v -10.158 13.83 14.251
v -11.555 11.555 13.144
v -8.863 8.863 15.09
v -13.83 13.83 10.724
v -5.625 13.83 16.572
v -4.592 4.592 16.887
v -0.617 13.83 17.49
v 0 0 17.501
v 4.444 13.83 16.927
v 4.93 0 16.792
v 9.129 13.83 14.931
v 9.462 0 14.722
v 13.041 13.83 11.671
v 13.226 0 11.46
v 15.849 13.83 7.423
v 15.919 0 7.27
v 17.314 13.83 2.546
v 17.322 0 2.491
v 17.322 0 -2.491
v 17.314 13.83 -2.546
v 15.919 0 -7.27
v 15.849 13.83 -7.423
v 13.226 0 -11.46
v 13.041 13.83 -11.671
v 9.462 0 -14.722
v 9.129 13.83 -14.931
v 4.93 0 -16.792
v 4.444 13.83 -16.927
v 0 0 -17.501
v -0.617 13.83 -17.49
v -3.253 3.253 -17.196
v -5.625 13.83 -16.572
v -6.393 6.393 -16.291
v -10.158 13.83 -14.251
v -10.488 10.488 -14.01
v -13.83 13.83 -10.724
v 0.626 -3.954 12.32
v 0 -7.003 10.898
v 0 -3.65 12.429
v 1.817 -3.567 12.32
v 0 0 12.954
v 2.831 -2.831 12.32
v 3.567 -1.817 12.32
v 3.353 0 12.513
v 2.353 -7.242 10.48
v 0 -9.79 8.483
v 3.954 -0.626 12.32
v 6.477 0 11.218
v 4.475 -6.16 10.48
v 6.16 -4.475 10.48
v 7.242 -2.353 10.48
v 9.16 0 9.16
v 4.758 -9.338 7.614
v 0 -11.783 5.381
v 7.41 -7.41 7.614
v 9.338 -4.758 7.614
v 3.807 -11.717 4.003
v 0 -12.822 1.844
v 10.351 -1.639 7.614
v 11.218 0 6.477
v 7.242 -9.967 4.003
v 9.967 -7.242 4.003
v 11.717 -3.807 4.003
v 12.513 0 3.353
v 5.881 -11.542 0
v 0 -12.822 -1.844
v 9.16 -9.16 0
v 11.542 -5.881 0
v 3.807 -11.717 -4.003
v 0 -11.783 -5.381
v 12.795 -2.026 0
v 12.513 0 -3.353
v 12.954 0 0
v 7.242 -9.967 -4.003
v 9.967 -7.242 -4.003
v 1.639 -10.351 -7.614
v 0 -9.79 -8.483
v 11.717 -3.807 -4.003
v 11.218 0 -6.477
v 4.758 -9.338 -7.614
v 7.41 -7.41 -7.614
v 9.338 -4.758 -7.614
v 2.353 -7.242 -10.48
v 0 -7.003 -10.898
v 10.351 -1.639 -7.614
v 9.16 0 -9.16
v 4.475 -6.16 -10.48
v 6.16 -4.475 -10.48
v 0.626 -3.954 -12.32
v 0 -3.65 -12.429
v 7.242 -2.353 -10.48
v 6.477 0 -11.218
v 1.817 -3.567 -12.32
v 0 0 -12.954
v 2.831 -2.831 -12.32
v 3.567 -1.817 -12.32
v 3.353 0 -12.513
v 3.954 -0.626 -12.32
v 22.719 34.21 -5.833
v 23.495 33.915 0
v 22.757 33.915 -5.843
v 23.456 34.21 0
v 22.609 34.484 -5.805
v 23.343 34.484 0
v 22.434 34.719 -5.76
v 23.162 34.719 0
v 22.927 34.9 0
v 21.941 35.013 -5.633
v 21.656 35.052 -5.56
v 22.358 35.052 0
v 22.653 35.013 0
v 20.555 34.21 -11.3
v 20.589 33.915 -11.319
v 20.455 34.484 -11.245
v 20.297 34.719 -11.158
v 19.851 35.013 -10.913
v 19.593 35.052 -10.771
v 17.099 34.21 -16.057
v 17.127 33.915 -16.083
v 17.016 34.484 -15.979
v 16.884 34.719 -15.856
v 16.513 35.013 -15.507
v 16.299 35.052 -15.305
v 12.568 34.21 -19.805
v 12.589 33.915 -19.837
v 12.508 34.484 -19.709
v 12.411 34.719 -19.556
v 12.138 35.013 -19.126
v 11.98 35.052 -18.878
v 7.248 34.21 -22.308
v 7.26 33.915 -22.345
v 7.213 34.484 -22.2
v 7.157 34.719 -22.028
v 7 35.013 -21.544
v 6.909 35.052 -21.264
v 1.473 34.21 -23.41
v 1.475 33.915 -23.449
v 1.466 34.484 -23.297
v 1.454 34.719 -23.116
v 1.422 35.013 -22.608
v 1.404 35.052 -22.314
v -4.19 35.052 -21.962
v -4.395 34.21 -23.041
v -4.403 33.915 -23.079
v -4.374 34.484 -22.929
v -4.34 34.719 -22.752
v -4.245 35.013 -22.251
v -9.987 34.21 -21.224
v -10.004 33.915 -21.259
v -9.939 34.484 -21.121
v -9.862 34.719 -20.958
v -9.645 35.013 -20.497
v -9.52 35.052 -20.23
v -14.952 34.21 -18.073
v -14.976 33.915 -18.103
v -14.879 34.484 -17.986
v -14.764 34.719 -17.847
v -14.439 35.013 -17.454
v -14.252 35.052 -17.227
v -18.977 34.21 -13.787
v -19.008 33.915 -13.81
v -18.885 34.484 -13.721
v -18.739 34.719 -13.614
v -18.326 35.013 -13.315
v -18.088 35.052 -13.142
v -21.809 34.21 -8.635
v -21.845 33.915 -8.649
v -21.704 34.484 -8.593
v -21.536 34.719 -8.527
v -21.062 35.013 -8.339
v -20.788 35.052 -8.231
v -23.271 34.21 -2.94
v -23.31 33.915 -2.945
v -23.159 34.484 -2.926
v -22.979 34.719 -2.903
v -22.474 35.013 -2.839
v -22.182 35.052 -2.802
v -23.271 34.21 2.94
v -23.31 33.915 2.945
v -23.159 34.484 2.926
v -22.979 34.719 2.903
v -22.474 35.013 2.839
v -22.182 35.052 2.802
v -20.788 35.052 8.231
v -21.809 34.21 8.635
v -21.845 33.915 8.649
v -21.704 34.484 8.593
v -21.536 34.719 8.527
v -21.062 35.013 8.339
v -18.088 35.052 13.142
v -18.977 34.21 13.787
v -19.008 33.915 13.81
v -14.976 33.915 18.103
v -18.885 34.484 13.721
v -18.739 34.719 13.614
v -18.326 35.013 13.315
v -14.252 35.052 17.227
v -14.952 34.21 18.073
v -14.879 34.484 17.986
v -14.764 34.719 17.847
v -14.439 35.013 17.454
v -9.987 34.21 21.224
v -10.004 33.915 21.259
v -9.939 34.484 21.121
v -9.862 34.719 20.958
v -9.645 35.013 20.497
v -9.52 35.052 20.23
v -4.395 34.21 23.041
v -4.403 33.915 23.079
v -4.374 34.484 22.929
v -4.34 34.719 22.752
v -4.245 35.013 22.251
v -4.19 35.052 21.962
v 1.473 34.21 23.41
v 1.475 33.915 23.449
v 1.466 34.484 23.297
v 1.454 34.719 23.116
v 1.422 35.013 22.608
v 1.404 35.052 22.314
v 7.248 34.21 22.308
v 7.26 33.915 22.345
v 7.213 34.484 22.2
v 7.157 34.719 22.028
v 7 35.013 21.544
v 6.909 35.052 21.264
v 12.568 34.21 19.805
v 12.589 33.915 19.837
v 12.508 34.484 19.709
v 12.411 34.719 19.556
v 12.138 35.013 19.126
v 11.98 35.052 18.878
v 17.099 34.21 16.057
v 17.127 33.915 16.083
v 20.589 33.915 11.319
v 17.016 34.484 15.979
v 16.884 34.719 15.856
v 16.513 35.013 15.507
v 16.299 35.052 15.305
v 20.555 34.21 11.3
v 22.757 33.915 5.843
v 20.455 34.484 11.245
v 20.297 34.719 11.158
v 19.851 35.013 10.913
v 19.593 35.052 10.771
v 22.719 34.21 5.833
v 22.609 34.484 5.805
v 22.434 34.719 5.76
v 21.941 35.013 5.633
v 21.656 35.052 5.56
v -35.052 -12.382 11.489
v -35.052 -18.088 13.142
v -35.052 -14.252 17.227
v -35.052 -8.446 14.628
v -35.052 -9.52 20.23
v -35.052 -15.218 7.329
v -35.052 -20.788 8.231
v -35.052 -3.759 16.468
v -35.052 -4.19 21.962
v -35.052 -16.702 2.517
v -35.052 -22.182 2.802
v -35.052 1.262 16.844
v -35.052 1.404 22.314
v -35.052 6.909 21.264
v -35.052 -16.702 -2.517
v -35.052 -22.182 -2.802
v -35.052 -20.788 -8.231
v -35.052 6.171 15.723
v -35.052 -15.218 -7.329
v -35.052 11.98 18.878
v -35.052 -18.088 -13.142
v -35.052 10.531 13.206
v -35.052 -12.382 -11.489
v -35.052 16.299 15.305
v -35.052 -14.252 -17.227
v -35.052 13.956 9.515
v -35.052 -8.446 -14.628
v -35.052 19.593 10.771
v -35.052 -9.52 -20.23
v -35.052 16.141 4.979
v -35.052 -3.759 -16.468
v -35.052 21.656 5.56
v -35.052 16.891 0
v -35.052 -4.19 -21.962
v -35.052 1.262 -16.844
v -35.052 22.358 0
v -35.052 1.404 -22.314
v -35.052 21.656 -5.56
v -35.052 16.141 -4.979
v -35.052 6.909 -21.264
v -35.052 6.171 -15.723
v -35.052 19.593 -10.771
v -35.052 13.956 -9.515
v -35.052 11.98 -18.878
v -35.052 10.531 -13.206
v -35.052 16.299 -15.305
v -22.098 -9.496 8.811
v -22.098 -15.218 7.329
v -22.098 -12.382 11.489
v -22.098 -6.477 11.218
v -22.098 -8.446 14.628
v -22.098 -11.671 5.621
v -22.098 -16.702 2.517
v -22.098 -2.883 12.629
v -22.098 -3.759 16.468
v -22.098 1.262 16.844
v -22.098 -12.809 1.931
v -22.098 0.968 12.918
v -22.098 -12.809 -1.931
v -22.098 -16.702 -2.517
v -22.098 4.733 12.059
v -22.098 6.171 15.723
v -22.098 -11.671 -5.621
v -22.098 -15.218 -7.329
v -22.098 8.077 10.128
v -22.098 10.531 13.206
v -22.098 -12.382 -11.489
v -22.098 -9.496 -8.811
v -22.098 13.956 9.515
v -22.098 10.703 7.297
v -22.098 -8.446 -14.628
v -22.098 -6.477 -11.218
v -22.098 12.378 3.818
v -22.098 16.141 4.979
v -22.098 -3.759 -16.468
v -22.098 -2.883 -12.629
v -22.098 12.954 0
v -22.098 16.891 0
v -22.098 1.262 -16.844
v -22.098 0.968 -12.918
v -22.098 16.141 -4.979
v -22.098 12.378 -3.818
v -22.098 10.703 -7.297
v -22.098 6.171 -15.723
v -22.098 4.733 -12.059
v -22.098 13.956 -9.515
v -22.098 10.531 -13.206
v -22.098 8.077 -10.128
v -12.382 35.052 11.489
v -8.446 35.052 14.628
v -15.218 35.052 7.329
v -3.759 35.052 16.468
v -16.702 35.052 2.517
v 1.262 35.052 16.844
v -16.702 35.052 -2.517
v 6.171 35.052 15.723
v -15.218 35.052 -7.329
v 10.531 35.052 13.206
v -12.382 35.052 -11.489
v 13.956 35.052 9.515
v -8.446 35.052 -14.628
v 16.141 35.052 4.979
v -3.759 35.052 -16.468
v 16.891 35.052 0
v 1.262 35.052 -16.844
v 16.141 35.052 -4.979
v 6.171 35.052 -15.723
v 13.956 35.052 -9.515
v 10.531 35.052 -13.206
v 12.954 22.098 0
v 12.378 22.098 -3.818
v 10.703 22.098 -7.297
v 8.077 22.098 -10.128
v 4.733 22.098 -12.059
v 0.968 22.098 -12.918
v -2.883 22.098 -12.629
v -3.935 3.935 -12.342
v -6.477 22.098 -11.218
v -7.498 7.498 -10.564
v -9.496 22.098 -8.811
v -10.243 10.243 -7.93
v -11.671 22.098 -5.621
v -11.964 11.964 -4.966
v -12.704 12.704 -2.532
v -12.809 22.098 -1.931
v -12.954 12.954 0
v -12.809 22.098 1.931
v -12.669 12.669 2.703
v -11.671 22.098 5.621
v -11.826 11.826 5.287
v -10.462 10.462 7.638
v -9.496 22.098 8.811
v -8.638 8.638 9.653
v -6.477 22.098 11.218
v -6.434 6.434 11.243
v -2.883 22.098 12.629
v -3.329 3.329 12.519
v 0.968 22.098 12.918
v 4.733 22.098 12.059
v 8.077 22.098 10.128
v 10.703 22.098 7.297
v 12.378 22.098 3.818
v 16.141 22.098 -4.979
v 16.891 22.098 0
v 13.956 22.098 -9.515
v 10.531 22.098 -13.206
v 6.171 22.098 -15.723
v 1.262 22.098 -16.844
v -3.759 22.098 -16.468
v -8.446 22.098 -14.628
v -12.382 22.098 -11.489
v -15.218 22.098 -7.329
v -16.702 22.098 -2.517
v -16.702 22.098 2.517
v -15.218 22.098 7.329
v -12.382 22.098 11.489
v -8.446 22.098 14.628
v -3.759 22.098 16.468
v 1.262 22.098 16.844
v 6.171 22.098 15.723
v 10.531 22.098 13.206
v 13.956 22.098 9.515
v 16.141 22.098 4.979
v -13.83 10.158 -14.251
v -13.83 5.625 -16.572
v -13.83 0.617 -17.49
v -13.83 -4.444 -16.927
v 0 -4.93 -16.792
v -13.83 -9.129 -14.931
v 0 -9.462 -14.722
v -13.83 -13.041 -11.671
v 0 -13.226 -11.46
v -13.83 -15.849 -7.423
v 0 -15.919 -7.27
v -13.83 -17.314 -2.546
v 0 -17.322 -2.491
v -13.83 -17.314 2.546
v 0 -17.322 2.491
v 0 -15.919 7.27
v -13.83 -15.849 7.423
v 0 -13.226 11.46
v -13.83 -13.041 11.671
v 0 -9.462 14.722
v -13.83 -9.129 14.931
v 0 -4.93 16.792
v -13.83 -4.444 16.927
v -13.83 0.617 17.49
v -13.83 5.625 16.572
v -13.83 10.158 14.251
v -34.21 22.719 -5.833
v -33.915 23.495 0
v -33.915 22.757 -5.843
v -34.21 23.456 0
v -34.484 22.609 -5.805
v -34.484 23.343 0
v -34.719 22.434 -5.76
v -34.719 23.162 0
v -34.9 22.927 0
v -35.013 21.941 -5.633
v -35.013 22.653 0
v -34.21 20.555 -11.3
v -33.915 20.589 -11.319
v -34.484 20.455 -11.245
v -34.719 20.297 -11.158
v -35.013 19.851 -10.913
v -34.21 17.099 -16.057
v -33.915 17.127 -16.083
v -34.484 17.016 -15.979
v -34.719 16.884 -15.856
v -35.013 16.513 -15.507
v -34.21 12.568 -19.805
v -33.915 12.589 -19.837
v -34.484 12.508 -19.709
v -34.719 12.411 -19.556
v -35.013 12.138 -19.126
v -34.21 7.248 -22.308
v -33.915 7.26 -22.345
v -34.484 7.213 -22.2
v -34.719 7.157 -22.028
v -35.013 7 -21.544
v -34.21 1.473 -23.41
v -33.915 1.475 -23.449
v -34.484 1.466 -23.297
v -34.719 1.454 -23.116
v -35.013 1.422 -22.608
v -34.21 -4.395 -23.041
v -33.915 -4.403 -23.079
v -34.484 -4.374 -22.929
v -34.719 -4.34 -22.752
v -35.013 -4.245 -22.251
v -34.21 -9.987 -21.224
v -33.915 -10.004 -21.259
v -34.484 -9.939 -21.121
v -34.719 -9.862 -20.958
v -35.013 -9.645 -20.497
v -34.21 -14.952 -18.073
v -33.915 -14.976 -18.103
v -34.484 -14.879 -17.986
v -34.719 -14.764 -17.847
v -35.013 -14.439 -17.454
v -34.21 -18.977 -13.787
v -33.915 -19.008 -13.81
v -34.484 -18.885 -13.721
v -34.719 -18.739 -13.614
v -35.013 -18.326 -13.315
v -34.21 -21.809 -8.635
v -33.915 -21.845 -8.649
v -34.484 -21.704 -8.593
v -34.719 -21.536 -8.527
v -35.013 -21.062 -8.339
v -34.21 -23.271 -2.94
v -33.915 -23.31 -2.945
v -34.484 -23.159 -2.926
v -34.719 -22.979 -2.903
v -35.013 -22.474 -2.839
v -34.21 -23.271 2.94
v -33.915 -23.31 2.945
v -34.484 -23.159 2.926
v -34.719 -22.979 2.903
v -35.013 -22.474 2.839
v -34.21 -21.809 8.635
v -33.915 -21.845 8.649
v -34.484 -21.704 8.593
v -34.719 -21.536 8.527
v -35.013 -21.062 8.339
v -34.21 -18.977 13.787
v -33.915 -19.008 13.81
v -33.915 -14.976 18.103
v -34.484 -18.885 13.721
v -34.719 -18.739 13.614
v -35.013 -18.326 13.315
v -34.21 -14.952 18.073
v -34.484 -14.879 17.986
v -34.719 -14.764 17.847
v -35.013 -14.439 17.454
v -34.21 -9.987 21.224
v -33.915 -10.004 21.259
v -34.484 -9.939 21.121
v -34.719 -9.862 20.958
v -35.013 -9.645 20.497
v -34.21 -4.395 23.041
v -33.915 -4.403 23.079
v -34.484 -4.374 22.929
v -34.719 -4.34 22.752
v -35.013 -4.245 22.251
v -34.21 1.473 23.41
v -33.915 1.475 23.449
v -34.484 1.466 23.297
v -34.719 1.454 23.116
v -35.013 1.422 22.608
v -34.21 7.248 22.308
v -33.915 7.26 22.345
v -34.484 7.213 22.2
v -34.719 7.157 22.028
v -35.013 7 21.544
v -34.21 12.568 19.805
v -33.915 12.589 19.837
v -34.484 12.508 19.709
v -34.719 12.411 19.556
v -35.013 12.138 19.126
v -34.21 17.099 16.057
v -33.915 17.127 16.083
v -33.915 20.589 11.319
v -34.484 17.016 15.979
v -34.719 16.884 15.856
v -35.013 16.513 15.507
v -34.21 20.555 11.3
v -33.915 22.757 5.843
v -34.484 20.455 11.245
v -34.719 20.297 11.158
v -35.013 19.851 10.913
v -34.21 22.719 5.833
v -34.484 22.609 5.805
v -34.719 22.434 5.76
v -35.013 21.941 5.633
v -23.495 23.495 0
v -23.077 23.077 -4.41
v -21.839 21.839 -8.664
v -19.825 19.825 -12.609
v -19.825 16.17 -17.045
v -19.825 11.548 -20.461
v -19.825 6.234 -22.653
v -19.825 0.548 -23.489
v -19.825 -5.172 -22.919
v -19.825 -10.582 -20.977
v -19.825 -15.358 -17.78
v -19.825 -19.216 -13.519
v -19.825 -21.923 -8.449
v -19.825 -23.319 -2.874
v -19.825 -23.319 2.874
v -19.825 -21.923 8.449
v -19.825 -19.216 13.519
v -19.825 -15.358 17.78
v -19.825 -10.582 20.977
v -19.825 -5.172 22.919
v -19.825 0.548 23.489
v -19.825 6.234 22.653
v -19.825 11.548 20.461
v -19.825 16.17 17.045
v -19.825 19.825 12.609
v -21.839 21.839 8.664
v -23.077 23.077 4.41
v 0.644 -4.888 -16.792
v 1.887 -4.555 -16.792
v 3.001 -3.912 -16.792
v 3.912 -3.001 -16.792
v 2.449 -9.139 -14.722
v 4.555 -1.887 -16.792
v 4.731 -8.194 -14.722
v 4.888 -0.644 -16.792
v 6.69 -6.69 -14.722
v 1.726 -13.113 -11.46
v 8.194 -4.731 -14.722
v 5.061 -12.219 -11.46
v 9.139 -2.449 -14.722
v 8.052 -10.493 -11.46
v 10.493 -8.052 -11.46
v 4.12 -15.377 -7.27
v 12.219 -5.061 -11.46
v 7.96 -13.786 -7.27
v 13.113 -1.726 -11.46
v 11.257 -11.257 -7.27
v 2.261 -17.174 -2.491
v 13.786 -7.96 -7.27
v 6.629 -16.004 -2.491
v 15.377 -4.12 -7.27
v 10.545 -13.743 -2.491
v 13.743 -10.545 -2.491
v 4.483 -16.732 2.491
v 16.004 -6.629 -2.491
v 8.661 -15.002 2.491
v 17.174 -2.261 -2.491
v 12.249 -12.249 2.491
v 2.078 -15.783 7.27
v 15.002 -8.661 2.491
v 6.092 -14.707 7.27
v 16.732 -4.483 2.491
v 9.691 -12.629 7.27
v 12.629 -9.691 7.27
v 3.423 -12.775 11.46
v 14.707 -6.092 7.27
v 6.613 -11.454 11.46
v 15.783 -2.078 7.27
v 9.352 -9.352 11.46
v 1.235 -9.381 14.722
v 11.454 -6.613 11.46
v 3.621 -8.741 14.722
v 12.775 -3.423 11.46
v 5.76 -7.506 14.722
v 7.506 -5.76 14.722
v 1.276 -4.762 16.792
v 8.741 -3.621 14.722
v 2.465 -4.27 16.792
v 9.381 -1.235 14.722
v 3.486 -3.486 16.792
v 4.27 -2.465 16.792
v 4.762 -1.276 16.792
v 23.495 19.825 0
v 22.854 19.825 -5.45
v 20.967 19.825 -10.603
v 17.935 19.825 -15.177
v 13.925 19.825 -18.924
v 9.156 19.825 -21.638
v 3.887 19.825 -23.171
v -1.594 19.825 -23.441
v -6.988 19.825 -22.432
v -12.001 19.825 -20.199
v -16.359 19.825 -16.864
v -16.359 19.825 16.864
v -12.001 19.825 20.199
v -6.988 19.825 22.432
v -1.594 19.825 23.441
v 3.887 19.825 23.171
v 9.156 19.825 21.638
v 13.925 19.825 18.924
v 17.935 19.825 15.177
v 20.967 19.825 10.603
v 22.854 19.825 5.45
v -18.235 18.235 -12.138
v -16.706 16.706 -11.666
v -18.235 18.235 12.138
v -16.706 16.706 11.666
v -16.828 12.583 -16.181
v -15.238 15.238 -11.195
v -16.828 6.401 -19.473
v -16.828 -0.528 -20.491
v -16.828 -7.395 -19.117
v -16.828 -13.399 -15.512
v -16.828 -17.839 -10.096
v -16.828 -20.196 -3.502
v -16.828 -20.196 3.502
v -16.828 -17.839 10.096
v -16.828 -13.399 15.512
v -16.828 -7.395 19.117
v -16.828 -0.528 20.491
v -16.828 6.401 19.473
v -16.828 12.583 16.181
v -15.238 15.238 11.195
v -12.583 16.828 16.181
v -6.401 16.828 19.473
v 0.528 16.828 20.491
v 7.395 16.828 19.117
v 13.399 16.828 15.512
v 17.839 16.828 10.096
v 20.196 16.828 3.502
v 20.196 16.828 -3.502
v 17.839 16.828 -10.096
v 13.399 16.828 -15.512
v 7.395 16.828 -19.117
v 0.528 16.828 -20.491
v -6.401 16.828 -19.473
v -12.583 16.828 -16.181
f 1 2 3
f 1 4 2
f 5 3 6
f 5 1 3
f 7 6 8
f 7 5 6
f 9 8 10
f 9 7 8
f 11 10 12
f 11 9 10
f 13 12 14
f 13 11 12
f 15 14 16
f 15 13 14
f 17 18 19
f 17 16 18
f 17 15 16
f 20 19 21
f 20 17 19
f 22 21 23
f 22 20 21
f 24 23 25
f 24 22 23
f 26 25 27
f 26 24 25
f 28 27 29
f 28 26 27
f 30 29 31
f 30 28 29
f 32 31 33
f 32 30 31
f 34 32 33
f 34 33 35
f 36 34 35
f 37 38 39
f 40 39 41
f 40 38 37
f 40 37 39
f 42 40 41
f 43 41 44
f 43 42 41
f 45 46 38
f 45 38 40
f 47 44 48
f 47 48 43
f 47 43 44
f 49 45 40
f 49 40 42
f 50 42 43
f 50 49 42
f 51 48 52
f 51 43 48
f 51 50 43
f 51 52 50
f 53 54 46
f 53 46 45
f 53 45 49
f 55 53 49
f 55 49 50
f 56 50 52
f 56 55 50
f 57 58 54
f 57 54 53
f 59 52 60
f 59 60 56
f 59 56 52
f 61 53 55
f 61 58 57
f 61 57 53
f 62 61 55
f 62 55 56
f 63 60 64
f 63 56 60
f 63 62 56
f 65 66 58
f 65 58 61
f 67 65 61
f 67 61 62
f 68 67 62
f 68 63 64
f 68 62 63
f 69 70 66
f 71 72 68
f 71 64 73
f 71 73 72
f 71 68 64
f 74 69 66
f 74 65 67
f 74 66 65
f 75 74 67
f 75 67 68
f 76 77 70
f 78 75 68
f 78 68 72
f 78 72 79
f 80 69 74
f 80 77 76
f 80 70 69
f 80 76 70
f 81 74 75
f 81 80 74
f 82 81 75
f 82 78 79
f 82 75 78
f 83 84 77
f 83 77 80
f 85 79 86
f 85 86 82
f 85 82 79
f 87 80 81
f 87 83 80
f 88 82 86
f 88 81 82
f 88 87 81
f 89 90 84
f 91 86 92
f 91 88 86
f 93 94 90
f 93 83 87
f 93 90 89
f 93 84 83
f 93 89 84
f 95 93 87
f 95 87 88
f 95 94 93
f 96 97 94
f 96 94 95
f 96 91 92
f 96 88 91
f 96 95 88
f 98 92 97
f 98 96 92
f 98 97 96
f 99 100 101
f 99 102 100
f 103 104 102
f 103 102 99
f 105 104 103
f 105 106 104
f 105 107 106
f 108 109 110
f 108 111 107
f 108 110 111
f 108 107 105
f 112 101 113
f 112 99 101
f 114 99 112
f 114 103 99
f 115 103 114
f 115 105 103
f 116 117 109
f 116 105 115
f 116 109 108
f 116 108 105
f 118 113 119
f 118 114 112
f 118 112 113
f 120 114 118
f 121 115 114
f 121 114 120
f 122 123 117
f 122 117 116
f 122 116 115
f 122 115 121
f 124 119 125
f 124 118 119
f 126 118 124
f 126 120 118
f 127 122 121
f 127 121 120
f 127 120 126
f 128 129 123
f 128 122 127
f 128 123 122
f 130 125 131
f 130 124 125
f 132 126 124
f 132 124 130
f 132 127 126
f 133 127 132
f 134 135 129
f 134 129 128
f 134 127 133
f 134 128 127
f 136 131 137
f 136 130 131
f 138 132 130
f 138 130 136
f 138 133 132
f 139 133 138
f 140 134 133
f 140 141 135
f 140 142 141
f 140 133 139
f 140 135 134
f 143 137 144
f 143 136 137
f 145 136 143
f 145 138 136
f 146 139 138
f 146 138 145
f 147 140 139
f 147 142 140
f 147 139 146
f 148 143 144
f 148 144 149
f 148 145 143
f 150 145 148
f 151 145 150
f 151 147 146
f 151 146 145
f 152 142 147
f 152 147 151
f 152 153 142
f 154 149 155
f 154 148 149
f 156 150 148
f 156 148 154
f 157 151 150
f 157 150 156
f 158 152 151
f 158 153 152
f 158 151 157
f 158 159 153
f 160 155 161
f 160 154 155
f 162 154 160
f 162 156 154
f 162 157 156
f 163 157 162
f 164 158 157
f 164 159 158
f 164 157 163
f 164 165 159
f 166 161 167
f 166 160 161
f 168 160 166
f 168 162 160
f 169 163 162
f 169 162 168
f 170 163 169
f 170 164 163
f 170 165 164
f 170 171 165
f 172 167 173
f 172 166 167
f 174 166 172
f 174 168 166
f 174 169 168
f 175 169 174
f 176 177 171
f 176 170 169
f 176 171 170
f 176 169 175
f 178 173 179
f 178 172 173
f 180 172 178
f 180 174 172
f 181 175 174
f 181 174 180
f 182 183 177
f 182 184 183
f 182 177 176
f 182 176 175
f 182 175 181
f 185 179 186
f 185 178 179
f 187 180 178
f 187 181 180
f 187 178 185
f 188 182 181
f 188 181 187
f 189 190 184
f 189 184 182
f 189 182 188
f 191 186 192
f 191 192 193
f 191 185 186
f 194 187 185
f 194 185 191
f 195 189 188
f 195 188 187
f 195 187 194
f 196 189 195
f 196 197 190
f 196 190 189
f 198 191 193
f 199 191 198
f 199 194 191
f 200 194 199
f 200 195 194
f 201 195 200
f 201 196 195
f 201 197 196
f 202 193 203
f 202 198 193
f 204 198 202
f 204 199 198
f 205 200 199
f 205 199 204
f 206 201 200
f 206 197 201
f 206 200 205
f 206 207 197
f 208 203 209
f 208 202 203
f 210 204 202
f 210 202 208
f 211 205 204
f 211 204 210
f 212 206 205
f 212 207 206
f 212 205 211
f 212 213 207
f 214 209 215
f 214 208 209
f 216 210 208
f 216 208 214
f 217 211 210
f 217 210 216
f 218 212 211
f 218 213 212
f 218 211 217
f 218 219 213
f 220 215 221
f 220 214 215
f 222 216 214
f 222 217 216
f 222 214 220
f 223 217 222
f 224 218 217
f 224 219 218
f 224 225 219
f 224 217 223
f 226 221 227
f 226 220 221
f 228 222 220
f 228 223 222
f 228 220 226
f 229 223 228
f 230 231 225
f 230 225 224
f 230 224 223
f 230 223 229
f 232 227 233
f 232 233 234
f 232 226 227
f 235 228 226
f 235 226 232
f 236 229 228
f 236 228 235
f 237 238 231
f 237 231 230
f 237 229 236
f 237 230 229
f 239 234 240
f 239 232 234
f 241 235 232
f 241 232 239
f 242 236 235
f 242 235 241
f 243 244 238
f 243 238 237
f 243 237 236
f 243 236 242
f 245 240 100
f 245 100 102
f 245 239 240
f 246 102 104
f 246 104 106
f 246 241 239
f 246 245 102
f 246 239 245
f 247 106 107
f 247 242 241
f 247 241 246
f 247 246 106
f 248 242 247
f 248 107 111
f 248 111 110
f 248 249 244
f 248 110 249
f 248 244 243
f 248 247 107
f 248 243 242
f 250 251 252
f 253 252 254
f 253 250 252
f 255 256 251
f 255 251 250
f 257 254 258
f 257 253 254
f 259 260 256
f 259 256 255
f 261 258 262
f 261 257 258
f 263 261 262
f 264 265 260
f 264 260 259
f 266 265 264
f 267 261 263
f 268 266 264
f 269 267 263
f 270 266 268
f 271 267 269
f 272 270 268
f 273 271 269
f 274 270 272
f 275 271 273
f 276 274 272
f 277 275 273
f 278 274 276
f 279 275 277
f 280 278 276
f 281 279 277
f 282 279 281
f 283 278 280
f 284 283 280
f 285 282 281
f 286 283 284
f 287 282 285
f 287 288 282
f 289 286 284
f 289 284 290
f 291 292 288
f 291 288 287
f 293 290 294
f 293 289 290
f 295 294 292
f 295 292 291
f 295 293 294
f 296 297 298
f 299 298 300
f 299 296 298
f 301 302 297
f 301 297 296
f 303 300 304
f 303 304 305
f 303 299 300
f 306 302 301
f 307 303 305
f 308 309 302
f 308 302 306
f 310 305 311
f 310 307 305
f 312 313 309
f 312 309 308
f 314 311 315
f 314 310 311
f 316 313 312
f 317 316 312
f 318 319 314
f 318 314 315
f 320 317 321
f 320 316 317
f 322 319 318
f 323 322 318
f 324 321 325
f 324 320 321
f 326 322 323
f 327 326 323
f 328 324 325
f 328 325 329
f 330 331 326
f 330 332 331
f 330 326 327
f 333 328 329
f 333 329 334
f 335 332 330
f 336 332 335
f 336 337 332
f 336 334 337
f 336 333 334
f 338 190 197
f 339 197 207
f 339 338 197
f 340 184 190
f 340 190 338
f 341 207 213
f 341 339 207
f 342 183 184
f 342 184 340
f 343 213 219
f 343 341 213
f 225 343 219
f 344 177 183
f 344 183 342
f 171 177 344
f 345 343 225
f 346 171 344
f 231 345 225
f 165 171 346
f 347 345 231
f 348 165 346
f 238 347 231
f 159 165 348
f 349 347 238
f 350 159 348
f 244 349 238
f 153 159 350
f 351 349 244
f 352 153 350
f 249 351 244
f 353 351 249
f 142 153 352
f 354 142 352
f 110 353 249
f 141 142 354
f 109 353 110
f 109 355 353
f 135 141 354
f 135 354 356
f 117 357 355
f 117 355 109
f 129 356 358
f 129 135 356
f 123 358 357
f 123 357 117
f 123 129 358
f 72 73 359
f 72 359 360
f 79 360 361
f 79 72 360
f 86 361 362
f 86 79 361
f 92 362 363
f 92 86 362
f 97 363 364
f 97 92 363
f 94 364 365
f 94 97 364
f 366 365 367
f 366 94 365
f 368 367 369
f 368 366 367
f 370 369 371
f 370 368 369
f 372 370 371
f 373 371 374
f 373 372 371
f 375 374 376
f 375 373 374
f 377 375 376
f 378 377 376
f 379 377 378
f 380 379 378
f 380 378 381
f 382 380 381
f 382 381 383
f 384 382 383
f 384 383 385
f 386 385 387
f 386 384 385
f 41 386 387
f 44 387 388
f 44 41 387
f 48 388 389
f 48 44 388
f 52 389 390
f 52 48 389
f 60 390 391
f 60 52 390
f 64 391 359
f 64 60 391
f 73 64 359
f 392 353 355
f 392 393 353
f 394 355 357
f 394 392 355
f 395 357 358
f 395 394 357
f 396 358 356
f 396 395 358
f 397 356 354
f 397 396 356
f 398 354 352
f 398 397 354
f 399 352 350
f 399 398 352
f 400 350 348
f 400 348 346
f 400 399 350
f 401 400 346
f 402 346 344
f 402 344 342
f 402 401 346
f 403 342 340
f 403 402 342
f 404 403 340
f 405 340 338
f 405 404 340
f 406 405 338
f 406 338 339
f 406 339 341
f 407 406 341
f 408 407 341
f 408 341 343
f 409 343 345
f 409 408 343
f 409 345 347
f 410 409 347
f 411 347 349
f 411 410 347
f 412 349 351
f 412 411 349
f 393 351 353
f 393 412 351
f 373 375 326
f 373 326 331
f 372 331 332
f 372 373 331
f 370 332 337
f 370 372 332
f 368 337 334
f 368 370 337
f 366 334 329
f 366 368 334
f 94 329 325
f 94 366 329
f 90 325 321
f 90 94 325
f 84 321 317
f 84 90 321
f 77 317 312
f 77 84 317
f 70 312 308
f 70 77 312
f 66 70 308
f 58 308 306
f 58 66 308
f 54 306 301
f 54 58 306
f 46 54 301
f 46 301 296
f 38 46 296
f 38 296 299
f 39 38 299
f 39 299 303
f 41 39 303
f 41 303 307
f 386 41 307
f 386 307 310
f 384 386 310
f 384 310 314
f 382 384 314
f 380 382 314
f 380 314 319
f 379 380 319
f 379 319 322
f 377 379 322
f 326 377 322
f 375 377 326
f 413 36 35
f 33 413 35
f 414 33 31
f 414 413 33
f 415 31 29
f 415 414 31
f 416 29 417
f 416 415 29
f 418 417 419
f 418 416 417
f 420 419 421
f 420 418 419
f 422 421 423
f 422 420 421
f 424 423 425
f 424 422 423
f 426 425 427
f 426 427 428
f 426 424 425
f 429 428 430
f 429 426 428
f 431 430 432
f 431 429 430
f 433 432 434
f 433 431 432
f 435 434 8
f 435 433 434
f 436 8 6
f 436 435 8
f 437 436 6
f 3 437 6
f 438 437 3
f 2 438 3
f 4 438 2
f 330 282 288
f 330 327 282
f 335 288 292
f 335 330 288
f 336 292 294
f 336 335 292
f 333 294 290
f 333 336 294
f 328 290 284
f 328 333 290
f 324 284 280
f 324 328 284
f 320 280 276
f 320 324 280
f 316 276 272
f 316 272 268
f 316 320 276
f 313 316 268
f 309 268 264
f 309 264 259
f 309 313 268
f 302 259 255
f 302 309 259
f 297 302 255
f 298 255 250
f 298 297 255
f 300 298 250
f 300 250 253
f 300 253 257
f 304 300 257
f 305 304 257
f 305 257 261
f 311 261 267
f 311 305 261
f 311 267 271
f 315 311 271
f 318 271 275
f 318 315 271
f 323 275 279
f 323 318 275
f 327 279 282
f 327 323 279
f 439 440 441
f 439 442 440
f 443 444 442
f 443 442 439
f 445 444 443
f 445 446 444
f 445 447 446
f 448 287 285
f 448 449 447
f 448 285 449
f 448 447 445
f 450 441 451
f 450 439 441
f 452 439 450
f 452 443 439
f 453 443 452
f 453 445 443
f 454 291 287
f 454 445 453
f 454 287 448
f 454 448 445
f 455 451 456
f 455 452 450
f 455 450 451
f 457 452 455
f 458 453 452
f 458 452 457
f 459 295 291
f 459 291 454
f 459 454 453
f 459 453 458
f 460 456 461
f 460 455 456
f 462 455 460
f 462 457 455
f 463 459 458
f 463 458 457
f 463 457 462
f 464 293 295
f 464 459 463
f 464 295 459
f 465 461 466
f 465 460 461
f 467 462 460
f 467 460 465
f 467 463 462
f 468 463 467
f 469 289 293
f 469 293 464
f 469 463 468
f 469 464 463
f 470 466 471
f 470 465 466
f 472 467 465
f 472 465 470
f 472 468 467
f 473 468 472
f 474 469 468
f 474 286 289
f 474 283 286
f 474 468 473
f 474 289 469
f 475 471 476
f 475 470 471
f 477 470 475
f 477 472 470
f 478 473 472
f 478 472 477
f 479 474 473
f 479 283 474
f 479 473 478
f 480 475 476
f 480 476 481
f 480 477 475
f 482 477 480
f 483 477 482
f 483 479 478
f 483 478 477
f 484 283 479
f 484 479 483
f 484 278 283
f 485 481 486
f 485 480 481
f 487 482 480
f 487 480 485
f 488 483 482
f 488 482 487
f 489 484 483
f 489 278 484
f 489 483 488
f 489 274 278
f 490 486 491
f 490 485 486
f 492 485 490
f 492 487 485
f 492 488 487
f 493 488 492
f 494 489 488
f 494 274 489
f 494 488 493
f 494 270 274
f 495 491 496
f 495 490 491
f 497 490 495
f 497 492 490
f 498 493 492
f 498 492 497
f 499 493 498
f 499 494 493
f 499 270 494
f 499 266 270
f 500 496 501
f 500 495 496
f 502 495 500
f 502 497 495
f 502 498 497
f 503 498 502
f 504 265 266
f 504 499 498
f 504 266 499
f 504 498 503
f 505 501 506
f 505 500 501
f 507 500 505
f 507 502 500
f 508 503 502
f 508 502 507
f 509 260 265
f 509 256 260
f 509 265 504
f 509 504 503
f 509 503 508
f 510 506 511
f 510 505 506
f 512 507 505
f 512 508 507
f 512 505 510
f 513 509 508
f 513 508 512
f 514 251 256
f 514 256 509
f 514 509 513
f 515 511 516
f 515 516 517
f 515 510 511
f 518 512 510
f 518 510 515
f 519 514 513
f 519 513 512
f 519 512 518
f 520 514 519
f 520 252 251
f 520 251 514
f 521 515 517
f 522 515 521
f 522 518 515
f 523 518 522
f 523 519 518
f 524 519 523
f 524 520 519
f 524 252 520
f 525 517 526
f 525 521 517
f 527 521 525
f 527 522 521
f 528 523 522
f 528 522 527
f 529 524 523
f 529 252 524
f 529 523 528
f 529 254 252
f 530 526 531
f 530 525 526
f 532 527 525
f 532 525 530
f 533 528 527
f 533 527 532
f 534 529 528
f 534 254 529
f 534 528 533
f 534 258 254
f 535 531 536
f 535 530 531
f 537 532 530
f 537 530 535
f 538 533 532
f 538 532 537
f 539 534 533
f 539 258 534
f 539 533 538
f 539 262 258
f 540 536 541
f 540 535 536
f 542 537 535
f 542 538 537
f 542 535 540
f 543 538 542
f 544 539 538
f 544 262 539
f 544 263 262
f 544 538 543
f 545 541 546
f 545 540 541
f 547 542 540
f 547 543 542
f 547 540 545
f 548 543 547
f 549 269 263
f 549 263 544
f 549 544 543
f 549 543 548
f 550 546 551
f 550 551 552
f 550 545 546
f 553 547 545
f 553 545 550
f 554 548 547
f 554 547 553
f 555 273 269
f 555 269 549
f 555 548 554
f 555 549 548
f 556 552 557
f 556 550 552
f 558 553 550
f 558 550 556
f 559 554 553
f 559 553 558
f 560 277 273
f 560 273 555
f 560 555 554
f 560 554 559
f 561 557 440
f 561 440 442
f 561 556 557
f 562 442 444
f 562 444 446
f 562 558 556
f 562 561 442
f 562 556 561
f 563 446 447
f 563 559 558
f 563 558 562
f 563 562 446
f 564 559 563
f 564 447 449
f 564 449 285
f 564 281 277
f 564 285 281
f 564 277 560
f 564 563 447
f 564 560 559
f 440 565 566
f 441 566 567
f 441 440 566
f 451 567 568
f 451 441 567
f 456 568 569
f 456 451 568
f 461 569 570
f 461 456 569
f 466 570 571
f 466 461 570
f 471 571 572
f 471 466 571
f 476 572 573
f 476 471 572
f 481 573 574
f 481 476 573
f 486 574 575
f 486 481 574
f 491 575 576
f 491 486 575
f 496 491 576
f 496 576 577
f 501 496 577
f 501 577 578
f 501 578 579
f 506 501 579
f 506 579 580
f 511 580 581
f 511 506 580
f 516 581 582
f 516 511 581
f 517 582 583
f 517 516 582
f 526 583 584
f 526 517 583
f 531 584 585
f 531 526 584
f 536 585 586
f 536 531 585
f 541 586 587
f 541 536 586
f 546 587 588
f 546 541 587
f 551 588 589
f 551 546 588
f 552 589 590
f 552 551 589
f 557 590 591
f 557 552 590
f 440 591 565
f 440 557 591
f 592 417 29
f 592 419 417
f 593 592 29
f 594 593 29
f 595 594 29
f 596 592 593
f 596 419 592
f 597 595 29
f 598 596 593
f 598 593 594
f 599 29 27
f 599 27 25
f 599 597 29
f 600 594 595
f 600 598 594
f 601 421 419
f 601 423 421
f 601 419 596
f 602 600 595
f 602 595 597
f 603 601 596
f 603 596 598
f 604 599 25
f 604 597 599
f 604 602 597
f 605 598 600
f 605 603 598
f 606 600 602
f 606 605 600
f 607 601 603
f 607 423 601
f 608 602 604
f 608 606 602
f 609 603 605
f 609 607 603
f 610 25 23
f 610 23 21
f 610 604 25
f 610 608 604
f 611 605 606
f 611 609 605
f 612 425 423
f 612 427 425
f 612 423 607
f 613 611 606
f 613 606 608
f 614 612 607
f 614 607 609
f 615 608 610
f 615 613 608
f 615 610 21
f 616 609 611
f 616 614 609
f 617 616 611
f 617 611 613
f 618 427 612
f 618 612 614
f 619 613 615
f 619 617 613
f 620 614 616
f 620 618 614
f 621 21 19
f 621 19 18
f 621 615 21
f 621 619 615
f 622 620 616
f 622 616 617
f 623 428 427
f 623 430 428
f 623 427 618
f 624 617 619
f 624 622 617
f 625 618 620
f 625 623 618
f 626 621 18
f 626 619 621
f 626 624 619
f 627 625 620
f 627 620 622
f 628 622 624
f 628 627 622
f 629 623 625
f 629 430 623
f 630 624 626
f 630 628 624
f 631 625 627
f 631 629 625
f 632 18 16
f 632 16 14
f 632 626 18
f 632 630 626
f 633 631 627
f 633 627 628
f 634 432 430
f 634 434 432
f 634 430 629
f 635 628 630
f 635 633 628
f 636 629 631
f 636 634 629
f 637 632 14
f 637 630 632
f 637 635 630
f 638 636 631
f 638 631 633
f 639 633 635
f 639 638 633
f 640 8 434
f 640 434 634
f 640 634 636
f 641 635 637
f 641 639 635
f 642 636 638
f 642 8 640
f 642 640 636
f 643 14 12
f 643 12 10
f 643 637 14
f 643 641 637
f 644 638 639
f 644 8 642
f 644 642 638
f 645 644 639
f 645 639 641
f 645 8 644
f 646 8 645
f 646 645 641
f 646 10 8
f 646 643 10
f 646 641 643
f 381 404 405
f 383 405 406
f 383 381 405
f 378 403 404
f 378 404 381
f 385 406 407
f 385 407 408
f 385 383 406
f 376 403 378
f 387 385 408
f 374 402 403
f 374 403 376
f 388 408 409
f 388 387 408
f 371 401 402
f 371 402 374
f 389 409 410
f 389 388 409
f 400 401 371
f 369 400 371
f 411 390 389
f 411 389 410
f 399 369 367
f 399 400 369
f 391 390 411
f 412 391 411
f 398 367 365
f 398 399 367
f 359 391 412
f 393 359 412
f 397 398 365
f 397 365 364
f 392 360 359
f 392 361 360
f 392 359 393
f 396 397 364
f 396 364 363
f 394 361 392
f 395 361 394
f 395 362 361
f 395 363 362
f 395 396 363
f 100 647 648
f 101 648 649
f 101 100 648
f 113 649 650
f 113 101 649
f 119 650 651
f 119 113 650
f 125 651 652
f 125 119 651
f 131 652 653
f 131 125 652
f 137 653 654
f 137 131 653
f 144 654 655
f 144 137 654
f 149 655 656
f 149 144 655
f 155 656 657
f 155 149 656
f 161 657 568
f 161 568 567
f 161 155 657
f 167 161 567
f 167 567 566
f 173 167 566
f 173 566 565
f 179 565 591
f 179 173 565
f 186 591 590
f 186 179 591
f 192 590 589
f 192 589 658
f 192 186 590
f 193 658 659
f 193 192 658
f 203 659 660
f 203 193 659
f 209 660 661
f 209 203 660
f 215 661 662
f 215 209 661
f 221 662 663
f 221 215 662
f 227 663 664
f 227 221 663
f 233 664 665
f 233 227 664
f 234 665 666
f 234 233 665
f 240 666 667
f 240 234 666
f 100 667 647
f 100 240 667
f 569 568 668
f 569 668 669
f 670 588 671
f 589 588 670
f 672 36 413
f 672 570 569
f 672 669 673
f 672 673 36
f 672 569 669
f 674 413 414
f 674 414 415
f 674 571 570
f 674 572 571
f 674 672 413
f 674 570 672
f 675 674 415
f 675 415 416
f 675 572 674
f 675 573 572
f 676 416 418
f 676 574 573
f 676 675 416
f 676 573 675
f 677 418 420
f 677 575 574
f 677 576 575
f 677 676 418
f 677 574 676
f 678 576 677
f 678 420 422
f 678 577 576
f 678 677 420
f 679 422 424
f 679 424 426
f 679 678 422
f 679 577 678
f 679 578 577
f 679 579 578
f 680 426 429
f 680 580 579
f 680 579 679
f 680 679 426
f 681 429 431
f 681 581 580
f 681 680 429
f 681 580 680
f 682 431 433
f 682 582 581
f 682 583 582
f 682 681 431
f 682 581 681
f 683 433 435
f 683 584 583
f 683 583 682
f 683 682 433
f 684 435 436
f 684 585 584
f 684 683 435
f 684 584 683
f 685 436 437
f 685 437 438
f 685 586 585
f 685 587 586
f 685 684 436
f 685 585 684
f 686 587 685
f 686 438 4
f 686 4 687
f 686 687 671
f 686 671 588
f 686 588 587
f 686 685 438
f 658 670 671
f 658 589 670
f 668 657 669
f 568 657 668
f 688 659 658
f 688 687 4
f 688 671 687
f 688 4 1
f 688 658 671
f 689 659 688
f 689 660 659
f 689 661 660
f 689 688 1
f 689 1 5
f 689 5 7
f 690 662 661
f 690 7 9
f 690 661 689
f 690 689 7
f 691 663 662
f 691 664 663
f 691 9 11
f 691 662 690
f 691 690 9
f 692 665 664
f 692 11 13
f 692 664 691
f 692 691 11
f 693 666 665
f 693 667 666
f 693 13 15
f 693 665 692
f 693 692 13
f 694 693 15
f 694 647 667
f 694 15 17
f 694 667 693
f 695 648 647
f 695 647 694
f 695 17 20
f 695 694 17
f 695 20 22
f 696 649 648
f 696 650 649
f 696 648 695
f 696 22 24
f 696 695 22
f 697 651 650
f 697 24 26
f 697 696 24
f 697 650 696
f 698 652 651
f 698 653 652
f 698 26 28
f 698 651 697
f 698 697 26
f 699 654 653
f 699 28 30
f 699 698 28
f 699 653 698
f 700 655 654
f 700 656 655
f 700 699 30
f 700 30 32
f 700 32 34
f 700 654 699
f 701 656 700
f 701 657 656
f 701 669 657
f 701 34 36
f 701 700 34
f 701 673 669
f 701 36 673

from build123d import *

# Parameters (mm, degrees)
CIRPATTERN2_COUNT  = 2
CIRPATTERN2_ANGLE  = 90
SKETCH4_R          = 12.954
CUT_EXTRUDE1_DEPTH = 55.857091
SKETCH5_R          = 12.954
CUT_EXTRUDE2_DEPTH = 55.857091
REVOLVE2_ANGLE     = 90


with BuildPart() as part:
    # Sketch2 → Revolve1 (revolve)
    with BuildSketch(Plane.XY, mode=Mode.PRIVATE) as revolve1_sk:
        with BuildLine():
            Line((-35.052, -16.891), (-22.098, -16.891))
            Line((-22.098, -16.891), (-22.098, -12.954))
            Line((-22.098, -12.954), (0, -12.954))
            Line((0, -12.954), (0, -17.5006))
            Line((0, -17.5006), (-13.8303, -17.5006))
            Line((-13.8303, -17.5006), (-19.8247, -23.495))
            Line((-19.8247, -23.495), (-33.91535, -23.495))
            ThreePointArc((-33.91535, -23.495), (-34.719082923, -23.162082923), (-35.052, -22.35835))
            Line((-35.052, -22.35835), (-35.052, -16.891))
        make_face()
    revolve(revolve1_sk.sketch.rotate(Axis((0, 0, 0), (-1, 0, 0)), 180), axis=Axis((0, 0, 0), (-1, 0, 0)))


with BuildPart() as cirpattern2_1:
    # CirPattern2: pattern copy
    add(part.part.rotate(Axis((0, 0, -23.495), (0, 0, -1)), 1 * CIRPATTERN2_ANGLE / (CIRPATTERN2_COUNT - 1)))

    # Sketch4 → Cut-Extrude1 (cut, through all)
    with BuildSketch(Plane(origin=(0, 0, 0), x_dir=(0, 0, -1), z_dir=(1, 0, 0))):
        with Locations(Location((0, 0, 0), (0, 0, 90))):
            Circle(SKETCH4_R)
    extrude(amount=-CUT_EXTRUDE1_DEPTH, mode=Mode.SUBTRACT)


with BuildPart() as part_1:
    add(part.part)

    # Sketch5 → Cut-Extrude2 (cut, through all)
    with BuildSketch(Plane.XZ):
        Circle(SKETCH5_R)
    extrude(amount=-CUT_EXTRUDE2_DEPTH, mode=Mode.SUBTRACT)

    # Combine1: union CirPattern2_1
    add(cirpattern2_1.part)

    # Sketch6 → Revolve2 (revolve)
    with BuildSketch(Plane(origin=(0, 0, 0), x_dir=(0, 0, -1), z_dir=(1, 0, 0))):
        with BuildLine():
            Line((-17.5006, 0), (-12.954, 0))
            ThreePointArc((-12.954, 0), (0, -12.954), (12.954, 0))
            Line((12.954, 0), (17.5006, 0))
            ThreePointArc((17.5006, 0), (0, -17.5006), (-17.5006, 0))
        make_face()
    revolve(axis=Axis((0, 0, 12.954), (0, 0, 1)), revolution_arc=REVOLVE2_ANGLE)


solid = part_1.part
